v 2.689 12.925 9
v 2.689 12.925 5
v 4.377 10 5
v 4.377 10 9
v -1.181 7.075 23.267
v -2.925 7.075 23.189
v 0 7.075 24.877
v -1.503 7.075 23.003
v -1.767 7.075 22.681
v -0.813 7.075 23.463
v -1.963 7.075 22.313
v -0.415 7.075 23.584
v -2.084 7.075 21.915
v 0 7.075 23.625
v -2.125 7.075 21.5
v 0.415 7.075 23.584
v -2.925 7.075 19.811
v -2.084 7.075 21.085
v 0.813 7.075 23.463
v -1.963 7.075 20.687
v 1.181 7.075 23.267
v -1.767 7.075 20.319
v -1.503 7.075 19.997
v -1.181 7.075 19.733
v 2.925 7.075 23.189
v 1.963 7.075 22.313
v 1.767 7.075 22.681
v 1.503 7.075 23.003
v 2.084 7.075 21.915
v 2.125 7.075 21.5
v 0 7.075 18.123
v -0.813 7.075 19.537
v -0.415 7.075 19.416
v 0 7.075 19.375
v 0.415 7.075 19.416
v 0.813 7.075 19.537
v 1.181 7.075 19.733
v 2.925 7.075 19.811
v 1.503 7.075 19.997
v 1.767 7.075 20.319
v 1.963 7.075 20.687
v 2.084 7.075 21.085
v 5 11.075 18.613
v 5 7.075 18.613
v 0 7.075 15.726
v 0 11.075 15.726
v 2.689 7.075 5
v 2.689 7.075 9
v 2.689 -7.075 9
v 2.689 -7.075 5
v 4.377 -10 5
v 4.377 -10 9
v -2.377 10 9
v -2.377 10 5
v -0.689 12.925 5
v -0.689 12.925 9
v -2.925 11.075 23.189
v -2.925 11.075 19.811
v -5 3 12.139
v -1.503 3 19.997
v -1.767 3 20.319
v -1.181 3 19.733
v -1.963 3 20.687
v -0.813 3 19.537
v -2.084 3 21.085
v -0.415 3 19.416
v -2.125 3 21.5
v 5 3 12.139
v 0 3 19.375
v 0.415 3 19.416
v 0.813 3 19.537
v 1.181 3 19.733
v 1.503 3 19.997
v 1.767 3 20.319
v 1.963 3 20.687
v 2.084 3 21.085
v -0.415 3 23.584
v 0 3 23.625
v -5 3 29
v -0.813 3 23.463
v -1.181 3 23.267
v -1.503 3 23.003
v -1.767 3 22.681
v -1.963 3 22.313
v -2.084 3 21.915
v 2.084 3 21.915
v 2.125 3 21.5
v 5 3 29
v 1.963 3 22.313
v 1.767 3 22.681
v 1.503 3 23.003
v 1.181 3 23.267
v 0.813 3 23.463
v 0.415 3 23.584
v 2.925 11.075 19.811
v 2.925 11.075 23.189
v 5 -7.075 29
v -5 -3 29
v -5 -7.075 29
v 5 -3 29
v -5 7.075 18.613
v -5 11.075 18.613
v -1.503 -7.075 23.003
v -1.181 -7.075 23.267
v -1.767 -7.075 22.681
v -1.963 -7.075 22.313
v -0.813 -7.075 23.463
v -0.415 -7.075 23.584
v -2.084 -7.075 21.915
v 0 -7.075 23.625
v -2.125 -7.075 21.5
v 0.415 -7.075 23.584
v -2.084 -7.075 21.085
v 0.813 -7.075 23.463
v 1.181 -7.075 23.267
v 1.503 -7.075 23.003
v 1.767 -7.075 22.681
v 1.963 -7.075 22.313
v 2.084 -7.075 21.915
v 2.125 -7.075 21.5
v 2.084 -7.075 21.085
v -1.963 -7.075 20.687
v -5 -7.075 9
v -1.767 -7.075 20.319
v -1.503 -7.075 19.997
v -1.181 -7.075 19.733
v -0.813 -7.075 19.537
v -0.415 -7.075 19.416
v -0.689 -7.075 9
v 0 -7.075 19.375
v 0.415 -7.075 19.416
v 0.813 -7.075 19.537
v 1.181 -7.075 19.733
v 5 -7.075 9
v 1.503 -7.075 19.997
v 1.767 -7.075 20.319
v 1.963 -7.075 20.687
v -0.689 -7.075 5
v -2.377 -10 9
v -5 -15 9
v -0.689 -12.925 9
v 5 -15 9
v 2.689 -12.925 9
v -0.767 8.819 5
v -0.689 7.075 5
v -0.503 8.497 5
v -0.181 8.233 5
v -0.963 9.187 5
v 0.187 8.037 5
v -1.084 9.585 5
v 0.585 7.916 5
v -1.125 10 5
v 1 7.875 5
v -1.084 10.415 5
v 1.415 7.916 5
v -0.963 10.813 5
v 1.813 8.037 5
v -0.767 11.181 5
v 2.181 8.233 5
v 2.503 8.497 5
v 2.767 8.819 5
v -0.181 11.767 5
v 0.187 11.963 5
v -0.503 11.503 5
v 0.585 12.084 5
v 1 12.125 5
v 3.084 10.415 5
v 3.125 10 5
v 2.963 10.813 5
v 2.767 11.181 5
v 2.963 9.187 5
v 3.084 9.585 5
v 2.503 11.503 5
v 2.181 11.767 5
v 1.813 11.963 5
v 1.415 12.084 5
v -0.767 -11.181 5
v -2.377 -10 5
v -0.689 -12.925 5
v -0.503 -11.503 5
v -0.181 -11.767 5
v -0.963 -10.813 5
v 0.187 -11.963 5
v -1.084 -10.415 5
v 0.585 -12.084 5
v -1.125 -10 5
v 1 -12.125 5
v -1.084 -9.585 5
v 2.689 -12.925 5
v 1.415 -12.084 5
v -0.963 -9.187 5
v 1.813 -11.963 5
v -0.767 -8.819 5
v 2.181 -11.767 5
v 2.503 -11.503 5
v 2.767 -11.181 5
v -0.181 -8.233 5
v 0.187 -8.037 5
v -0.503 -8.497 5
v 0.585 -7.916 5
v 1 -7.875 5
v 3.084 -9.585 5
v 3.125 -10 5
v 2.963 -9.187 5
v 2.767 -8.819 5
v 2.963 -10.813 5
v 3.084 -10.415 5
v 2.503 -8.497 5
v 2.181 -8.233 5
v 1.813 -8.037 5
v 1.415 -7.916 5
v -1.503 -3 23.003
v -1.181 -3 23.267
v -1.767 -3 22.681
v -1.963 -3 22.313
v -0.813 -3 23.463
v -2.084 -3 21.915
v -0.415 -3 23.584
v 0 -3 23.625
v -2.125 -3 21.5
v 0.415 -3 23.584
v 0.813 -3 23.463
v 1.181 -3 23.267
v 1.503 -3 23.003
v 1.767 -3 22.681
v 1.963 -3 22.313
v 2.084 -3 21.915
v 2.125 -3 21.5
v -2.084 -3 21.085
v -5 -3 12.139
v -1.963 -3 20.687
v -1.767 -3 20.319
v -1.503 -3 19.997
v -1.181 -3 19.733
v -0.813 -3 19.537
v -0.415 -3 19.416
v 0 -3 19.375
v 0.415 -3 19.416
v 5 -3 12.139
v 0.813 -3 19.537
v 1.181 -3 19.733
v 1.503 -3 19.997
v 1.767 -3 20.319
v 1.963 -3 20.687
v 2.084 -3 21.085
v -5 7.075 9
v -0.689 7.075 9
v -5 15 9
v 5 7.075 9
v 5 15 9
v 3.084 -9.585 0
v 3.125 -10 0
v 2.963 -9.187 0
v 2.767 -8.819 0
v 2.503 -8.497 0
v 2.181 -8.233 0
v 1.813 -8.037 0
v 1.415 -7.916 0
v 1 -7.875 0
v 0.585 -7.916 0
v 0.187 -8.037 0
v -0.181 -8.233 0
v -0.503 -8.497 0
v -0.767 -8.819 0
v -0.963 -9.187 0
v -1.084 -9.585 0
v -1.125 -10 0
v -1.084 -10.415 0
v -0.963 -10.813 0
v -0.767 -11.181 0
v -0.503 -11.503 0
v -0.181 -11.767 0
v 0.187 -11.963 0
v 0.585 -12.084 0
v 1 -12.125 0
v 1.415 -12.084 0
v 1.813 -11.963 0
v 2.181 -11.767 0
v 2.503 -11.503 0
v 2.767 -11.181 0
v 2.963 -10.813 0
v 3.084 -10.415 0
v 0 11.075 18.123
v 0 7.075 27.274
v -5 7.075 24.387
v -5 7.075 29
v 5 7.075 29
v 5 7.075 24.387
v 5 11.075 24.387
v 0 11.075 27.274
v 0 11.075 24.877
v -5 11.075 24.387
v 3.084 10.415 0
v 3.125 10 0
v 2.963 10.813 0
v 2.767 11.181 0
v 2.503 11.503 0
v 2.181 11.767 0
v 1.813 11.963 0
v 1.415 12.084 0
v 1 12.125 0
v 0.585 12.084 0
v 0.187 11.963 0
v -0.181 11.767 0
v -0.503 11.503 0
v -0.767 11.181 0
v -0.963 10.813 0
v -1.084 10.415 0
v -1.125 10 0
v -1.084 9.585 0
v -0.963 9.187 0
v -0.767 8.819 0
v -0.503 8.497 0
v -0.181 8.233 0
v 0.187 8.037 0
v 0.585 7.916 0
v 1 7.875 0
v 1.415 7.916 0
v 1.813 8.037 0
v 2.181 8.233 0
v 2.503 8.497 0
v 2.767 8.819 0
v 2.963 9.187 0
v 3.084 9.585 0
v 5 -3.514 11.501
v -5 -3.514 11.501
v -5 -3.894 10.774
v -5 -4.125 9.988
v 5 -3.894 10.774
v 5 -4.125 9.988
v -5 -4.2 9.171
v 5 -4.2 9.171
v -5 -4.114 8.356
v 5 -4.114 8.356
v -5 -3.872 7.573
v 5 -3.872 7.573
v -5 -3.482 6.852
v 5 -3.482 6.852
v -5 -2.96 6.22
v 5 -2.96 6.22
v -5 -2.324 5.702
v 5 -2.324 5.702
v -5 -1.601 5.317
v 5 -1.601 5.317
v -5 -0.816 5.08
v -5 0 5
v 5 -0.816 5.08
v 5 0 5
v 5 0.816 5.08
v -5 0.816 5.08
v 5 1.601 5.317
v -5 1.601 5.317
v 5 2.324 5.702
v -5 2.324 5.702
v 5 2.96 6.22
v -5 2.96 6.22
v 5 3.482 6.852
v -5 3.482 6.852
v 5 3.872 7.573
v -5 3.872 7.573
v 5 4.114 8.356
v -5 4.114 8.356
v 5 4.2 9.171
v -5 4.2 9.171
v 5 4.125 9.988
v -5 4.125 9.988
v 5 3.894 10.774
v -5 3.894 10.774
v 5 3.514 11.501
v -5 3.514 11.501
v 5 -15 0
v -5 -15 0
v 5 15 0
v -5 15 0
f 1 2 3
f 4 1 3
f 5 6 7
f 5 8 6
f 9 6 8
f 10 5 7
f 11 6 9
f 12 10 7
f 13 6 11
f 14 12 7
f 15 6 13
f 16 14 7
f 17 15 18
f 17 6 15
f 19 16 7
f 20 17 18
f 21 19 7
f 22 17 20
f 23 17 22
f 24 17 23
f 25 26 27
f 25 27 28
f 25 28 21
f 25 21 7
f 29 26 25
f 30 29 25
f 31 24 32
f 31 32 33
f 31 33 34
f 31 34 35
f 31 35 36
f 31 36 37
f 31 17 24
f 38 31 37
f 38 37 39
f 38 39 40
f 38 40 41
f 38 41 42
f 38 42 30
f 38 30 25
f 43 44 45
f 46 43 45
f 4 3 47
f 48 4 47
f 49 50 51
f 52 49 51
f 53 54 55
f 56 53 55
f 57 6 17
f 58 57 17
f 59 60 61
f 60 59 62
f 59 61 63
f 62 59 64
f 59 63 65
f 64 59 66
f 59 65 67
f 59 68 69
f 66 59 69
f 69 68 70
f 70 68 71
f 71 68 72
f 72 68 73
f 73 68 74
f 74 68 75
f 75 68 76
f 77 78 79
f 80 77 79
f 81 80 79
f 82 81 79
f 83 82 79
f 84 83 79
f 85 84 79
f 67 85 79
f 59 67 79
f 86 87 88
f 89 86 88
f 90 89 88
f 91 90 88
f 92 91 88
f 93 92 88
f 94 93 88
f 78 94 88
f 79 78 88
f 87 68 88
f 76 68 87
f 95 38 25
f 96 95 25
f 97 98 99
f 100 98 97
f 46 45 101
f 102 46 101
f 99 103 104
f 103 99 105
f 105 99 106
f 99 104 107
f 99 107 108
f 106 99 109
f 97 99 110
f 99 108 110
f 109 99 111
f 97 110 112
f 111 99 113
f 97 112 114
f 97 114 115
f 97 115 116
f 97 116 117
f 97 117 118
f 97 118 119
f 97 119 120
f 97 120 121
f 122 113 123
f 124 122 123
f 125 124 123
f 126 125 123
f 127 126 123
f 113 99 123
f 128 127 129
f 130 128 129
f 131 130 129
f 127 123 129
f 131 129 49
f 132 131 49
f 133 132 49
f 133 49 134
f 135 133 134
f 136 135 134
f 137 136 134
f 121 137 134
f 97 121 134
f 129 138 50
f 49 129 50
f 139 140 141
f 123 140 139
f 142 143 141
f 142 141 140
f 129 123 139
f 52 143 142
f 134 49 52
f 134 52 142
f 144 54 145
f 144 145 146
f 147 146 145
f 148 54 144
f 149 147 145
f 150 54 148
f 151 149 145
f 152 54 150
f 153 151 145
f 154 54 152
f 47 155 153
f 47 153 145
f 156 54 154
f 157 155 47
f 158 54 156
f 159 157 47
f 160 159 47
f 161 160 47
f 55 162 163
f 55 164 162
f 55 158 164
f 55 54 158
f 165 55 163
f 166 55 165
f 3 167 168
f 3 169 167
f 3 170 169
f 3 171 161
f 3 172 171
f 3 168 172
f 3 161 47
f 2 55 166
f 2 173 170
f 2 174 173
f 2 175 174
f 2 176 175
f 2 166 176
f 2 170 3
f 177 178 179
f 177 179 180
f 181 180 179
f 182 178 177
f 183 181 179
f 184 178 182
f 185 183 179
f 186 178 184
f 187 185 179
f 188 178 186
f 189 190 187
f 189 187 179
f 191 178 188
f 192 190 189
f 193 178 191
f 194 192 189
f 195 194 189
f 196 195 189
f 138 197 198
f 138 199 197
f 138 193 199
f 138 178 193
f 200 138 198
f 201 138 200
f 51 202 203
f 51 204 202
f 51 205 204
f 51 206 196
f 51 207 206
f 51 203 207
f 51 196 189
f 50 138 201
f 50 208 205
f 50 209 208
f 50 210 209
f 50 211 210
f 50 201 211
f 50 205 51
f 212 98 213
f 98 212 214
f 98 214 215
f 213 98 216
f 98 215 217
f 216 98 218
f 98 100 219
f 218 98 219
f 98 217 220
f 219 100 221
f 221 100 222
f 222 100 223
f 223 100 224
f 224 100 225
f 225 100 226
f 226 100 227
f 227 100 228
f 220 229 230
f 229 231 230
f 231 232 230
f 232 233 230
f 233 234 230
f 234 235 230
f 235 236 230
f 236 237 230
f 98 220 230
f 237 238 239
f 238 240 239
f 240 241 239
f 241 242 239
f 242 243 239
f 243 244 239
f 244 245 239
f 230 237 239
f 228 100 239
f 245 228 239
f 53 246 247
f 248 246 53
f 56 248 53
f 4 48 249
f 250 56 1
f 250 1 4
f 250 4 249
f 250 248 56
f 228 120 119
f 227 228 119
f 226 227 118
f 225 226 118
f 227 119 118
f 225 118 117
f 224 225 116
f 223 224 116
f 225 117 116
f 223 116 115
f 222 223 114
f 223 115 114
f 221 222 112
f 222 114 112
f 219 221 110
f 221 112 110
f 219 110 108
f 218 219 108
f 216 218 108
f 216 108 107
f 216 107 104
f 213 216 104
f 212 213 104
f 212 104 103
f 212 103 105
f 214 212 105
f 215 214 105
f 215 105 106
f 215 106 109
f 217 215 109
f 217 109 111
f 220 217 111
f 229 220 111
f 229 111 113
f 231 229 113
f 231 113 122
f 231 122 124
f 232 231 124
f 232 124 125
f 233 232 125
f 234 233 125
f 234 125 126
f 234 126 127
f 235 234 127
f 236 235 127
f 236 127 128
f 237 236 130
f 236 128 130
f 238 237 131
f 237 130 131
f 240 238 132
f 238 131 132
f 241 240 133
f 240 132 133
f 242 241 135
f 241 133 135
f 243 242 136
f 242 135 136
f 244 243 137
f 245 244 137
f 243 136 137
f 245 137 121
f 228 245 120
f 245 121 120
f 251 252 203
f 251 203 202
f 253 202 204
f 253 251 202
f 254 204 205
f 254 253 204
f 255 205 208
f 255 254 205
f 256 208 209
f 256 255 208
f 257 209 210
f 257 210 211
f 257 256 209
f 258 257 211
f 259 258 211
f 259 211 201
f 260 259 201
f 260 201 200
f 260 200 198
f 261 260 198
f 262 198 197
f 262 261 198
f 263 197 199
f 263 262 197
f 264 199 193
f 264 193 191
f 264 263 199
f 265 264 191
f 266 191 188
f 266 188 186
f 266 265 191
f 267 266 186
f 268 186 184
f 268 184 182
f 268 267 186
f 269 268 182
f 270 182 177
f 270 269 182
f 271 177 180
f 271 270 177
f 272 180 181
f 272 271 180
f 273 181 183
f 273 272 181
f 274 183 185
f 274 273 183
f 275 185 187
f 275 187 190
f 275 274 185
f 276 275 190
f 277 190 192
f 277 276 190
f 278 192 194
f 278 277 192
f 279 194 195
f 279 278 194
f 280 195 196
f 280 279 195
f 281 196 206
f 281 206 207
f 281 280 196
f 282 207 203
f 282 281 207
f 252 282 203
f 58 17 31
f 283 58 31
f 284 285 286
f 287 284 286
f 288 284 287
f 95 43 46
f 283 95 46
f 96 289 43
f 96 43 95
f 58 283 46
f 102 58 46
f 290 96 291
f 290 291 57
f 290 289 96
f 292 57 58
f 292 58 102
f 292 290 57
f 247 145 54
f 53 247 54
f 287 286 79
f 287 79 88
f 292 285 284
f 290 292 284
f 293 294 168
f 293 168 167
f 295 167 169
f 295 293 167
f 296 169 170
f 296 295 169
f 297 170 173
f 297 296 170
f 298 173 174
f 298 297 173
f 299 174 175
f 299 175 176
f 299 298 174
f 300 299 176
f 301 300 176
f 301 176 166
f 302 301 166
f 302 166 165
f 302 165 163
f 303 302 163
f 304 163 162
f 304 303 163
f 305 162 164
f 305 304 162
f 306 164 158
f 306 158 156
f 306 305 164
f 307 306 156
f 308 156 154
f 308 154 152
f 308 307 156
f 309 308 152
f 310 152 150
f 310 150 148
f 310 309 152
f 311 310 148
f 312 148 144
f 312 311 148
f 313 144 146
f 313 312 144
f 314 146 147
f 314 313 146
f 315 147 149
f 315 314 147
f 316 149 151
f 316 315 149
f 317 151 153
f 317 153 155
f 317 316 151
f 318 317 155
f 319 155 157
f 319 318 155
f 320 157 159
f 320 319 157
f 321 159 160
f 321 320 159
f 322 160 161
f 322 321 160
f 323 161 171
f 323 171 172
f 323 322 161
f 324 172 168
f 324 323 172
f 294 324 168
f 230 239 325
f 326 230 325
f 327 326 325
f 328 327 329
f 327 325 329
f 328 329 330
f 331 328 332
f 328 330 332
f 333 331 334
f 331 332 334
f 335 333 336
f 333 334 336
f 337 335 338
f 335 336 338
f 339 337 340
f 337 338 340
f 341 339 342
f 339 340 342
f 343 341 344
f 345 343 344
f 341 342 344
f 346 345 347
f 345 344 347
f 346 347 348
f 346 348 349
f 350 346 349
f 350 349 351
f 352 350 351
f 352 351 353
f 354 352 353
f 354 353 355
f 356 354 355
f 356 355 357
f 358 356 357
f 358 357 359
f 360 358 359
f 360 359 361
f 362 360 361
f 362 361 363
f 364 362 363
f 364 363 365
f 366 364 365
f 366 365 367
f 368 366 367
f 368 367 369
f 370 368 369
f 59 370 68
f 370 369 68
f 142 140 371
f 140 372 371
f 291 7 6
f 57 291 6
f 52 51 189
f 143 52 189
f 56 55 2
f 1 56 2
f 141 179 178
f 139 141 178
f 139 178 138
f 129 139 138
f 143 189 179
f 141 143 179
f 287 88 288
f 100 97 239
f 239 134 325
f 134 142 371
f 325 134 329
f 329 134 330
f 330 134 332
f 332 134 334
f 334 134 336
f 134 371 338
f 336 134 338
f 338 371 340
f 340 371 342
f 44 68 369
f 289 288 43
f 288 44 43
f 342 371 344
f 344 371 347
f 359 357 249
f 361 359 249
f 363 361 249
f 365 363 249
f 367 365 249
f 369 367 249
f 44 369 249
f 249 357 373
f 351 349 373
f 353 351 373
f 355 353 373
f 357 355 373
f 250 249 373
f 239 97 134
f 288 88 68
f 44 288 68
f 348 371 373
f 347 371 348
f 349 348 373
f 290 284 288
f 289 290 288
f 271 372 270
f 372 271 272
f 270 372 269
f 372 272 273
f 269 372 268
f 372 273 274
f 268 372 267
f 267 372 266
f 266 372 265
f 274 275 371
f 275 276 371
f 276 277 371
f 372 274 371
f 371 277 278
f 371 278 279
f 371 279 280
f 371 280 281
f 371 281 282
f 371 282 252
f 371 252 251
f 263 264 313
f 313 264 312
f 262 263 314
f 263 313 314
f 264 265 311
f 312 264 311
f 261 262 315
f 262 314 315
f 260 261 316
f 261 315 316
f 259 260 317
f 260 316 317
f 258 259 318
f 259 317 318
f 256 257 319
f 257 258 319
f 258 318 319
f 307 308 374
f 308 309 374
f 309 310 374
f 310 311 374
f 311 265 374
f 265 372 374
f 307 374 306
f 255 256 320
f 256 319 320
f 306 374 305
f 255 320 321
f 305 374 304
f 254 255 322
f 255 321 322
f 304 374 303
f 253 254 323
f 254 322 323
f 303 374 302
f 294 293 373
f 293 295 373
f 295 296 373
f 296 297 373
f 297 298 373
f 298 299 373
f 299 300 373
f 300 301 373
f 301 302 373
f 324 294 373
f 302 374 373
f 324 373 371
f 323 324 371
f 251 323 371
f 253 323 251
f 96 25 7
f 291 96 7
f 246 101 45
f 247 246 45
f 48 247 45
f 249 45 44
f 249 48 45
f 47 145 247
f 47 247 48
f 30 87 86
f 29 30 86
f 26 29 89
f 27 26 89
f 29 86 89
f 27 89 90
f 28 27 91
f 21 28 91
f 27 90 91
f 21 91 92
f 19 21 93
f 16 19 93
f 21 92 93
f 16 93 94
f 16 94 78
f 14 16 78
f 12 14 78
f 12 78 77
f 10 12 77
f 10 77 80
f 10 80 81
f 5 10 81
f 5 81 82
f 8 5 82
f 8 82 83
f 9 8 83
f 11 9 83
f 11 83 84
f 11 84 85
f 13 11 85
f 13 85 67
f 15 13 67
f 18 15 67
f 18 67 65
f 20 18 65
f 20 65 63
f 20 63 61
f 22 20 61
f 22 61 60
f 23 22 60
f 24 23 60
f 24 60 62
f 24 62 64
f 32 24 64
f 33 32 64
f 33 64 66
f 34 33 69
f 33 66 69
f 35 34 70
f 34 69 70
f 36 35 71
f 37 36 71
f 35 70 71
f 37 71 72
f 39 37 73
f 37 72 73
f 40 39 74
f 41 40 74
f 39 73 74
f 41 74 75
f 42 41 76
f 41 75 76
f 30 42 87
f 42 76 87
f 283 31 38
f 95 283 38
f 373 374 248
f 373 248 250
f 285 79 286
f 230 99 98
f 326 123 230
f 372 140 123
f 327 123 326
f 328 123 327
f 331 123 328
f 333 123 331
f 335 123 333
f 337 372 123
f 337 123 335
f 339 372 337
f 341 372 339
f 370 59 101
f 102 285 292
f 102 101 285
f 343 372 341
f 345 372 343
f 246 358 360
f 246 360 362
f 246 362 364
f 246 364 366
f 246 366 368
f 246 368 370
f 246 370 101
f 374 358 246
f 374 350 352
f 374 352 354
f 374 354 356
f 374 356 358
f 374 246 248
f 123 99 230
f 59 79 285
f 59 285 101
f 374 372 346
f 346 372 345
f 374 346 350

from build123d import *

# Parameters (mm, degrees)
F0_W      = 10
F0_H      = 30
F0_R      = 2.125
F1_DEPTH  = 5
F2_W      = 10
F2_H      = 30
F3_DEPTH  = 4
F4_W      = 10
F4_H      = 14.15
F5_DEPTH  = 20
F7_DEPTH  = 10.001
F8_R      = 2.125
F9_DEPTH  = 22.076
F11_DEPTH = 4


with BuildPart() as f1:
    # F0 (on Top) → F1 (new body)
    with BuildSketch(Plane.XY):
        Rectangle(F0_W, F0_H)
        with Locations((1, -10)):
            Circle(F0_R, mode=Mode.SUBTRACT)
        with Locations((1, 10)):
            Circle(F0_R, mode=Mode.SUBTRACT)
    extrude(amount=F1_DEPTH)

    # F2 (on face) → F3 (join)
    with BuildSketch(Plane.XY.offset(5)):
        Rectangle(F2_W, F2_H)
        Polygon((-0.68875, -7.075), (2.68875, -7.075), (4.377499, -10), (2.68875, -12.925), (-0.68875, -12.925), (-2.377499, -10), align=None, mode=Mode.SUBTRACT)
        Polygon((4.377499, 10), (2.68875, 7.075), (-0.68875, 7.075), (-2.377499, 10), (-0.68875, 12.925), (2.68875, 12.925), align=None, mode=Mode.SUBTRACT)
    extrude(amount=F3_DEPTH)

    # F4 (on face) → F5 (join)
    with BuildSketch(Plane.XY.offset(9)):
        Rectangle(F4_W, F4_H)
    extrude(amount=F5_DEPTH)

    # F6 (on face) → F7 (cut, through all)
    with BuildSketch(Plane.YZ.offset(5)):
        with BuildLine():
            ThreePointArc((-3, 12.139388), (0, 5), (3, 12.139388))
            Line((3, 12.139388), (3, 29))
            Line((3, 29), (-3, 29))
            Line((-3, 29), (-3, 12.139388))
        make_face()
    extrude(amount=-F7_DEPTH, mode=Mode.SUBTRACT)

    # F8 (on face) → F9 (cut, through all)
    with BuildSketch(Plane.XZ.offset(7.075)):
        with Locations((0, 21.5)):
            Circle(F8_R)
    extrude(amount=-F9_DEPTH, mode=Mode.SUBTRACT)

    # F10 (on face) → F11 (join)
    with BuildSketch(Plane(origin=(0, 7.075, 0), x_dir=(-1, 0, 0), z_dir=(0, 1, 0))):
        Polygon((5, 18.613249), (5, 24.386751), (0, 27.273503), (-5, 24.386751), (-5, 18.613249), (0, 15.726497), align=None)
        Polygon((0, 24.877499), (2.925, 23.18875), (2.925, 19.81125), (0, 18.122501), (-2.925, 19.81125), (-2.925, 23.18875), align=None, mode=Mode.SUBTRACT)
    extrude(amount=F11_DEPTH)


solid = f1.part
